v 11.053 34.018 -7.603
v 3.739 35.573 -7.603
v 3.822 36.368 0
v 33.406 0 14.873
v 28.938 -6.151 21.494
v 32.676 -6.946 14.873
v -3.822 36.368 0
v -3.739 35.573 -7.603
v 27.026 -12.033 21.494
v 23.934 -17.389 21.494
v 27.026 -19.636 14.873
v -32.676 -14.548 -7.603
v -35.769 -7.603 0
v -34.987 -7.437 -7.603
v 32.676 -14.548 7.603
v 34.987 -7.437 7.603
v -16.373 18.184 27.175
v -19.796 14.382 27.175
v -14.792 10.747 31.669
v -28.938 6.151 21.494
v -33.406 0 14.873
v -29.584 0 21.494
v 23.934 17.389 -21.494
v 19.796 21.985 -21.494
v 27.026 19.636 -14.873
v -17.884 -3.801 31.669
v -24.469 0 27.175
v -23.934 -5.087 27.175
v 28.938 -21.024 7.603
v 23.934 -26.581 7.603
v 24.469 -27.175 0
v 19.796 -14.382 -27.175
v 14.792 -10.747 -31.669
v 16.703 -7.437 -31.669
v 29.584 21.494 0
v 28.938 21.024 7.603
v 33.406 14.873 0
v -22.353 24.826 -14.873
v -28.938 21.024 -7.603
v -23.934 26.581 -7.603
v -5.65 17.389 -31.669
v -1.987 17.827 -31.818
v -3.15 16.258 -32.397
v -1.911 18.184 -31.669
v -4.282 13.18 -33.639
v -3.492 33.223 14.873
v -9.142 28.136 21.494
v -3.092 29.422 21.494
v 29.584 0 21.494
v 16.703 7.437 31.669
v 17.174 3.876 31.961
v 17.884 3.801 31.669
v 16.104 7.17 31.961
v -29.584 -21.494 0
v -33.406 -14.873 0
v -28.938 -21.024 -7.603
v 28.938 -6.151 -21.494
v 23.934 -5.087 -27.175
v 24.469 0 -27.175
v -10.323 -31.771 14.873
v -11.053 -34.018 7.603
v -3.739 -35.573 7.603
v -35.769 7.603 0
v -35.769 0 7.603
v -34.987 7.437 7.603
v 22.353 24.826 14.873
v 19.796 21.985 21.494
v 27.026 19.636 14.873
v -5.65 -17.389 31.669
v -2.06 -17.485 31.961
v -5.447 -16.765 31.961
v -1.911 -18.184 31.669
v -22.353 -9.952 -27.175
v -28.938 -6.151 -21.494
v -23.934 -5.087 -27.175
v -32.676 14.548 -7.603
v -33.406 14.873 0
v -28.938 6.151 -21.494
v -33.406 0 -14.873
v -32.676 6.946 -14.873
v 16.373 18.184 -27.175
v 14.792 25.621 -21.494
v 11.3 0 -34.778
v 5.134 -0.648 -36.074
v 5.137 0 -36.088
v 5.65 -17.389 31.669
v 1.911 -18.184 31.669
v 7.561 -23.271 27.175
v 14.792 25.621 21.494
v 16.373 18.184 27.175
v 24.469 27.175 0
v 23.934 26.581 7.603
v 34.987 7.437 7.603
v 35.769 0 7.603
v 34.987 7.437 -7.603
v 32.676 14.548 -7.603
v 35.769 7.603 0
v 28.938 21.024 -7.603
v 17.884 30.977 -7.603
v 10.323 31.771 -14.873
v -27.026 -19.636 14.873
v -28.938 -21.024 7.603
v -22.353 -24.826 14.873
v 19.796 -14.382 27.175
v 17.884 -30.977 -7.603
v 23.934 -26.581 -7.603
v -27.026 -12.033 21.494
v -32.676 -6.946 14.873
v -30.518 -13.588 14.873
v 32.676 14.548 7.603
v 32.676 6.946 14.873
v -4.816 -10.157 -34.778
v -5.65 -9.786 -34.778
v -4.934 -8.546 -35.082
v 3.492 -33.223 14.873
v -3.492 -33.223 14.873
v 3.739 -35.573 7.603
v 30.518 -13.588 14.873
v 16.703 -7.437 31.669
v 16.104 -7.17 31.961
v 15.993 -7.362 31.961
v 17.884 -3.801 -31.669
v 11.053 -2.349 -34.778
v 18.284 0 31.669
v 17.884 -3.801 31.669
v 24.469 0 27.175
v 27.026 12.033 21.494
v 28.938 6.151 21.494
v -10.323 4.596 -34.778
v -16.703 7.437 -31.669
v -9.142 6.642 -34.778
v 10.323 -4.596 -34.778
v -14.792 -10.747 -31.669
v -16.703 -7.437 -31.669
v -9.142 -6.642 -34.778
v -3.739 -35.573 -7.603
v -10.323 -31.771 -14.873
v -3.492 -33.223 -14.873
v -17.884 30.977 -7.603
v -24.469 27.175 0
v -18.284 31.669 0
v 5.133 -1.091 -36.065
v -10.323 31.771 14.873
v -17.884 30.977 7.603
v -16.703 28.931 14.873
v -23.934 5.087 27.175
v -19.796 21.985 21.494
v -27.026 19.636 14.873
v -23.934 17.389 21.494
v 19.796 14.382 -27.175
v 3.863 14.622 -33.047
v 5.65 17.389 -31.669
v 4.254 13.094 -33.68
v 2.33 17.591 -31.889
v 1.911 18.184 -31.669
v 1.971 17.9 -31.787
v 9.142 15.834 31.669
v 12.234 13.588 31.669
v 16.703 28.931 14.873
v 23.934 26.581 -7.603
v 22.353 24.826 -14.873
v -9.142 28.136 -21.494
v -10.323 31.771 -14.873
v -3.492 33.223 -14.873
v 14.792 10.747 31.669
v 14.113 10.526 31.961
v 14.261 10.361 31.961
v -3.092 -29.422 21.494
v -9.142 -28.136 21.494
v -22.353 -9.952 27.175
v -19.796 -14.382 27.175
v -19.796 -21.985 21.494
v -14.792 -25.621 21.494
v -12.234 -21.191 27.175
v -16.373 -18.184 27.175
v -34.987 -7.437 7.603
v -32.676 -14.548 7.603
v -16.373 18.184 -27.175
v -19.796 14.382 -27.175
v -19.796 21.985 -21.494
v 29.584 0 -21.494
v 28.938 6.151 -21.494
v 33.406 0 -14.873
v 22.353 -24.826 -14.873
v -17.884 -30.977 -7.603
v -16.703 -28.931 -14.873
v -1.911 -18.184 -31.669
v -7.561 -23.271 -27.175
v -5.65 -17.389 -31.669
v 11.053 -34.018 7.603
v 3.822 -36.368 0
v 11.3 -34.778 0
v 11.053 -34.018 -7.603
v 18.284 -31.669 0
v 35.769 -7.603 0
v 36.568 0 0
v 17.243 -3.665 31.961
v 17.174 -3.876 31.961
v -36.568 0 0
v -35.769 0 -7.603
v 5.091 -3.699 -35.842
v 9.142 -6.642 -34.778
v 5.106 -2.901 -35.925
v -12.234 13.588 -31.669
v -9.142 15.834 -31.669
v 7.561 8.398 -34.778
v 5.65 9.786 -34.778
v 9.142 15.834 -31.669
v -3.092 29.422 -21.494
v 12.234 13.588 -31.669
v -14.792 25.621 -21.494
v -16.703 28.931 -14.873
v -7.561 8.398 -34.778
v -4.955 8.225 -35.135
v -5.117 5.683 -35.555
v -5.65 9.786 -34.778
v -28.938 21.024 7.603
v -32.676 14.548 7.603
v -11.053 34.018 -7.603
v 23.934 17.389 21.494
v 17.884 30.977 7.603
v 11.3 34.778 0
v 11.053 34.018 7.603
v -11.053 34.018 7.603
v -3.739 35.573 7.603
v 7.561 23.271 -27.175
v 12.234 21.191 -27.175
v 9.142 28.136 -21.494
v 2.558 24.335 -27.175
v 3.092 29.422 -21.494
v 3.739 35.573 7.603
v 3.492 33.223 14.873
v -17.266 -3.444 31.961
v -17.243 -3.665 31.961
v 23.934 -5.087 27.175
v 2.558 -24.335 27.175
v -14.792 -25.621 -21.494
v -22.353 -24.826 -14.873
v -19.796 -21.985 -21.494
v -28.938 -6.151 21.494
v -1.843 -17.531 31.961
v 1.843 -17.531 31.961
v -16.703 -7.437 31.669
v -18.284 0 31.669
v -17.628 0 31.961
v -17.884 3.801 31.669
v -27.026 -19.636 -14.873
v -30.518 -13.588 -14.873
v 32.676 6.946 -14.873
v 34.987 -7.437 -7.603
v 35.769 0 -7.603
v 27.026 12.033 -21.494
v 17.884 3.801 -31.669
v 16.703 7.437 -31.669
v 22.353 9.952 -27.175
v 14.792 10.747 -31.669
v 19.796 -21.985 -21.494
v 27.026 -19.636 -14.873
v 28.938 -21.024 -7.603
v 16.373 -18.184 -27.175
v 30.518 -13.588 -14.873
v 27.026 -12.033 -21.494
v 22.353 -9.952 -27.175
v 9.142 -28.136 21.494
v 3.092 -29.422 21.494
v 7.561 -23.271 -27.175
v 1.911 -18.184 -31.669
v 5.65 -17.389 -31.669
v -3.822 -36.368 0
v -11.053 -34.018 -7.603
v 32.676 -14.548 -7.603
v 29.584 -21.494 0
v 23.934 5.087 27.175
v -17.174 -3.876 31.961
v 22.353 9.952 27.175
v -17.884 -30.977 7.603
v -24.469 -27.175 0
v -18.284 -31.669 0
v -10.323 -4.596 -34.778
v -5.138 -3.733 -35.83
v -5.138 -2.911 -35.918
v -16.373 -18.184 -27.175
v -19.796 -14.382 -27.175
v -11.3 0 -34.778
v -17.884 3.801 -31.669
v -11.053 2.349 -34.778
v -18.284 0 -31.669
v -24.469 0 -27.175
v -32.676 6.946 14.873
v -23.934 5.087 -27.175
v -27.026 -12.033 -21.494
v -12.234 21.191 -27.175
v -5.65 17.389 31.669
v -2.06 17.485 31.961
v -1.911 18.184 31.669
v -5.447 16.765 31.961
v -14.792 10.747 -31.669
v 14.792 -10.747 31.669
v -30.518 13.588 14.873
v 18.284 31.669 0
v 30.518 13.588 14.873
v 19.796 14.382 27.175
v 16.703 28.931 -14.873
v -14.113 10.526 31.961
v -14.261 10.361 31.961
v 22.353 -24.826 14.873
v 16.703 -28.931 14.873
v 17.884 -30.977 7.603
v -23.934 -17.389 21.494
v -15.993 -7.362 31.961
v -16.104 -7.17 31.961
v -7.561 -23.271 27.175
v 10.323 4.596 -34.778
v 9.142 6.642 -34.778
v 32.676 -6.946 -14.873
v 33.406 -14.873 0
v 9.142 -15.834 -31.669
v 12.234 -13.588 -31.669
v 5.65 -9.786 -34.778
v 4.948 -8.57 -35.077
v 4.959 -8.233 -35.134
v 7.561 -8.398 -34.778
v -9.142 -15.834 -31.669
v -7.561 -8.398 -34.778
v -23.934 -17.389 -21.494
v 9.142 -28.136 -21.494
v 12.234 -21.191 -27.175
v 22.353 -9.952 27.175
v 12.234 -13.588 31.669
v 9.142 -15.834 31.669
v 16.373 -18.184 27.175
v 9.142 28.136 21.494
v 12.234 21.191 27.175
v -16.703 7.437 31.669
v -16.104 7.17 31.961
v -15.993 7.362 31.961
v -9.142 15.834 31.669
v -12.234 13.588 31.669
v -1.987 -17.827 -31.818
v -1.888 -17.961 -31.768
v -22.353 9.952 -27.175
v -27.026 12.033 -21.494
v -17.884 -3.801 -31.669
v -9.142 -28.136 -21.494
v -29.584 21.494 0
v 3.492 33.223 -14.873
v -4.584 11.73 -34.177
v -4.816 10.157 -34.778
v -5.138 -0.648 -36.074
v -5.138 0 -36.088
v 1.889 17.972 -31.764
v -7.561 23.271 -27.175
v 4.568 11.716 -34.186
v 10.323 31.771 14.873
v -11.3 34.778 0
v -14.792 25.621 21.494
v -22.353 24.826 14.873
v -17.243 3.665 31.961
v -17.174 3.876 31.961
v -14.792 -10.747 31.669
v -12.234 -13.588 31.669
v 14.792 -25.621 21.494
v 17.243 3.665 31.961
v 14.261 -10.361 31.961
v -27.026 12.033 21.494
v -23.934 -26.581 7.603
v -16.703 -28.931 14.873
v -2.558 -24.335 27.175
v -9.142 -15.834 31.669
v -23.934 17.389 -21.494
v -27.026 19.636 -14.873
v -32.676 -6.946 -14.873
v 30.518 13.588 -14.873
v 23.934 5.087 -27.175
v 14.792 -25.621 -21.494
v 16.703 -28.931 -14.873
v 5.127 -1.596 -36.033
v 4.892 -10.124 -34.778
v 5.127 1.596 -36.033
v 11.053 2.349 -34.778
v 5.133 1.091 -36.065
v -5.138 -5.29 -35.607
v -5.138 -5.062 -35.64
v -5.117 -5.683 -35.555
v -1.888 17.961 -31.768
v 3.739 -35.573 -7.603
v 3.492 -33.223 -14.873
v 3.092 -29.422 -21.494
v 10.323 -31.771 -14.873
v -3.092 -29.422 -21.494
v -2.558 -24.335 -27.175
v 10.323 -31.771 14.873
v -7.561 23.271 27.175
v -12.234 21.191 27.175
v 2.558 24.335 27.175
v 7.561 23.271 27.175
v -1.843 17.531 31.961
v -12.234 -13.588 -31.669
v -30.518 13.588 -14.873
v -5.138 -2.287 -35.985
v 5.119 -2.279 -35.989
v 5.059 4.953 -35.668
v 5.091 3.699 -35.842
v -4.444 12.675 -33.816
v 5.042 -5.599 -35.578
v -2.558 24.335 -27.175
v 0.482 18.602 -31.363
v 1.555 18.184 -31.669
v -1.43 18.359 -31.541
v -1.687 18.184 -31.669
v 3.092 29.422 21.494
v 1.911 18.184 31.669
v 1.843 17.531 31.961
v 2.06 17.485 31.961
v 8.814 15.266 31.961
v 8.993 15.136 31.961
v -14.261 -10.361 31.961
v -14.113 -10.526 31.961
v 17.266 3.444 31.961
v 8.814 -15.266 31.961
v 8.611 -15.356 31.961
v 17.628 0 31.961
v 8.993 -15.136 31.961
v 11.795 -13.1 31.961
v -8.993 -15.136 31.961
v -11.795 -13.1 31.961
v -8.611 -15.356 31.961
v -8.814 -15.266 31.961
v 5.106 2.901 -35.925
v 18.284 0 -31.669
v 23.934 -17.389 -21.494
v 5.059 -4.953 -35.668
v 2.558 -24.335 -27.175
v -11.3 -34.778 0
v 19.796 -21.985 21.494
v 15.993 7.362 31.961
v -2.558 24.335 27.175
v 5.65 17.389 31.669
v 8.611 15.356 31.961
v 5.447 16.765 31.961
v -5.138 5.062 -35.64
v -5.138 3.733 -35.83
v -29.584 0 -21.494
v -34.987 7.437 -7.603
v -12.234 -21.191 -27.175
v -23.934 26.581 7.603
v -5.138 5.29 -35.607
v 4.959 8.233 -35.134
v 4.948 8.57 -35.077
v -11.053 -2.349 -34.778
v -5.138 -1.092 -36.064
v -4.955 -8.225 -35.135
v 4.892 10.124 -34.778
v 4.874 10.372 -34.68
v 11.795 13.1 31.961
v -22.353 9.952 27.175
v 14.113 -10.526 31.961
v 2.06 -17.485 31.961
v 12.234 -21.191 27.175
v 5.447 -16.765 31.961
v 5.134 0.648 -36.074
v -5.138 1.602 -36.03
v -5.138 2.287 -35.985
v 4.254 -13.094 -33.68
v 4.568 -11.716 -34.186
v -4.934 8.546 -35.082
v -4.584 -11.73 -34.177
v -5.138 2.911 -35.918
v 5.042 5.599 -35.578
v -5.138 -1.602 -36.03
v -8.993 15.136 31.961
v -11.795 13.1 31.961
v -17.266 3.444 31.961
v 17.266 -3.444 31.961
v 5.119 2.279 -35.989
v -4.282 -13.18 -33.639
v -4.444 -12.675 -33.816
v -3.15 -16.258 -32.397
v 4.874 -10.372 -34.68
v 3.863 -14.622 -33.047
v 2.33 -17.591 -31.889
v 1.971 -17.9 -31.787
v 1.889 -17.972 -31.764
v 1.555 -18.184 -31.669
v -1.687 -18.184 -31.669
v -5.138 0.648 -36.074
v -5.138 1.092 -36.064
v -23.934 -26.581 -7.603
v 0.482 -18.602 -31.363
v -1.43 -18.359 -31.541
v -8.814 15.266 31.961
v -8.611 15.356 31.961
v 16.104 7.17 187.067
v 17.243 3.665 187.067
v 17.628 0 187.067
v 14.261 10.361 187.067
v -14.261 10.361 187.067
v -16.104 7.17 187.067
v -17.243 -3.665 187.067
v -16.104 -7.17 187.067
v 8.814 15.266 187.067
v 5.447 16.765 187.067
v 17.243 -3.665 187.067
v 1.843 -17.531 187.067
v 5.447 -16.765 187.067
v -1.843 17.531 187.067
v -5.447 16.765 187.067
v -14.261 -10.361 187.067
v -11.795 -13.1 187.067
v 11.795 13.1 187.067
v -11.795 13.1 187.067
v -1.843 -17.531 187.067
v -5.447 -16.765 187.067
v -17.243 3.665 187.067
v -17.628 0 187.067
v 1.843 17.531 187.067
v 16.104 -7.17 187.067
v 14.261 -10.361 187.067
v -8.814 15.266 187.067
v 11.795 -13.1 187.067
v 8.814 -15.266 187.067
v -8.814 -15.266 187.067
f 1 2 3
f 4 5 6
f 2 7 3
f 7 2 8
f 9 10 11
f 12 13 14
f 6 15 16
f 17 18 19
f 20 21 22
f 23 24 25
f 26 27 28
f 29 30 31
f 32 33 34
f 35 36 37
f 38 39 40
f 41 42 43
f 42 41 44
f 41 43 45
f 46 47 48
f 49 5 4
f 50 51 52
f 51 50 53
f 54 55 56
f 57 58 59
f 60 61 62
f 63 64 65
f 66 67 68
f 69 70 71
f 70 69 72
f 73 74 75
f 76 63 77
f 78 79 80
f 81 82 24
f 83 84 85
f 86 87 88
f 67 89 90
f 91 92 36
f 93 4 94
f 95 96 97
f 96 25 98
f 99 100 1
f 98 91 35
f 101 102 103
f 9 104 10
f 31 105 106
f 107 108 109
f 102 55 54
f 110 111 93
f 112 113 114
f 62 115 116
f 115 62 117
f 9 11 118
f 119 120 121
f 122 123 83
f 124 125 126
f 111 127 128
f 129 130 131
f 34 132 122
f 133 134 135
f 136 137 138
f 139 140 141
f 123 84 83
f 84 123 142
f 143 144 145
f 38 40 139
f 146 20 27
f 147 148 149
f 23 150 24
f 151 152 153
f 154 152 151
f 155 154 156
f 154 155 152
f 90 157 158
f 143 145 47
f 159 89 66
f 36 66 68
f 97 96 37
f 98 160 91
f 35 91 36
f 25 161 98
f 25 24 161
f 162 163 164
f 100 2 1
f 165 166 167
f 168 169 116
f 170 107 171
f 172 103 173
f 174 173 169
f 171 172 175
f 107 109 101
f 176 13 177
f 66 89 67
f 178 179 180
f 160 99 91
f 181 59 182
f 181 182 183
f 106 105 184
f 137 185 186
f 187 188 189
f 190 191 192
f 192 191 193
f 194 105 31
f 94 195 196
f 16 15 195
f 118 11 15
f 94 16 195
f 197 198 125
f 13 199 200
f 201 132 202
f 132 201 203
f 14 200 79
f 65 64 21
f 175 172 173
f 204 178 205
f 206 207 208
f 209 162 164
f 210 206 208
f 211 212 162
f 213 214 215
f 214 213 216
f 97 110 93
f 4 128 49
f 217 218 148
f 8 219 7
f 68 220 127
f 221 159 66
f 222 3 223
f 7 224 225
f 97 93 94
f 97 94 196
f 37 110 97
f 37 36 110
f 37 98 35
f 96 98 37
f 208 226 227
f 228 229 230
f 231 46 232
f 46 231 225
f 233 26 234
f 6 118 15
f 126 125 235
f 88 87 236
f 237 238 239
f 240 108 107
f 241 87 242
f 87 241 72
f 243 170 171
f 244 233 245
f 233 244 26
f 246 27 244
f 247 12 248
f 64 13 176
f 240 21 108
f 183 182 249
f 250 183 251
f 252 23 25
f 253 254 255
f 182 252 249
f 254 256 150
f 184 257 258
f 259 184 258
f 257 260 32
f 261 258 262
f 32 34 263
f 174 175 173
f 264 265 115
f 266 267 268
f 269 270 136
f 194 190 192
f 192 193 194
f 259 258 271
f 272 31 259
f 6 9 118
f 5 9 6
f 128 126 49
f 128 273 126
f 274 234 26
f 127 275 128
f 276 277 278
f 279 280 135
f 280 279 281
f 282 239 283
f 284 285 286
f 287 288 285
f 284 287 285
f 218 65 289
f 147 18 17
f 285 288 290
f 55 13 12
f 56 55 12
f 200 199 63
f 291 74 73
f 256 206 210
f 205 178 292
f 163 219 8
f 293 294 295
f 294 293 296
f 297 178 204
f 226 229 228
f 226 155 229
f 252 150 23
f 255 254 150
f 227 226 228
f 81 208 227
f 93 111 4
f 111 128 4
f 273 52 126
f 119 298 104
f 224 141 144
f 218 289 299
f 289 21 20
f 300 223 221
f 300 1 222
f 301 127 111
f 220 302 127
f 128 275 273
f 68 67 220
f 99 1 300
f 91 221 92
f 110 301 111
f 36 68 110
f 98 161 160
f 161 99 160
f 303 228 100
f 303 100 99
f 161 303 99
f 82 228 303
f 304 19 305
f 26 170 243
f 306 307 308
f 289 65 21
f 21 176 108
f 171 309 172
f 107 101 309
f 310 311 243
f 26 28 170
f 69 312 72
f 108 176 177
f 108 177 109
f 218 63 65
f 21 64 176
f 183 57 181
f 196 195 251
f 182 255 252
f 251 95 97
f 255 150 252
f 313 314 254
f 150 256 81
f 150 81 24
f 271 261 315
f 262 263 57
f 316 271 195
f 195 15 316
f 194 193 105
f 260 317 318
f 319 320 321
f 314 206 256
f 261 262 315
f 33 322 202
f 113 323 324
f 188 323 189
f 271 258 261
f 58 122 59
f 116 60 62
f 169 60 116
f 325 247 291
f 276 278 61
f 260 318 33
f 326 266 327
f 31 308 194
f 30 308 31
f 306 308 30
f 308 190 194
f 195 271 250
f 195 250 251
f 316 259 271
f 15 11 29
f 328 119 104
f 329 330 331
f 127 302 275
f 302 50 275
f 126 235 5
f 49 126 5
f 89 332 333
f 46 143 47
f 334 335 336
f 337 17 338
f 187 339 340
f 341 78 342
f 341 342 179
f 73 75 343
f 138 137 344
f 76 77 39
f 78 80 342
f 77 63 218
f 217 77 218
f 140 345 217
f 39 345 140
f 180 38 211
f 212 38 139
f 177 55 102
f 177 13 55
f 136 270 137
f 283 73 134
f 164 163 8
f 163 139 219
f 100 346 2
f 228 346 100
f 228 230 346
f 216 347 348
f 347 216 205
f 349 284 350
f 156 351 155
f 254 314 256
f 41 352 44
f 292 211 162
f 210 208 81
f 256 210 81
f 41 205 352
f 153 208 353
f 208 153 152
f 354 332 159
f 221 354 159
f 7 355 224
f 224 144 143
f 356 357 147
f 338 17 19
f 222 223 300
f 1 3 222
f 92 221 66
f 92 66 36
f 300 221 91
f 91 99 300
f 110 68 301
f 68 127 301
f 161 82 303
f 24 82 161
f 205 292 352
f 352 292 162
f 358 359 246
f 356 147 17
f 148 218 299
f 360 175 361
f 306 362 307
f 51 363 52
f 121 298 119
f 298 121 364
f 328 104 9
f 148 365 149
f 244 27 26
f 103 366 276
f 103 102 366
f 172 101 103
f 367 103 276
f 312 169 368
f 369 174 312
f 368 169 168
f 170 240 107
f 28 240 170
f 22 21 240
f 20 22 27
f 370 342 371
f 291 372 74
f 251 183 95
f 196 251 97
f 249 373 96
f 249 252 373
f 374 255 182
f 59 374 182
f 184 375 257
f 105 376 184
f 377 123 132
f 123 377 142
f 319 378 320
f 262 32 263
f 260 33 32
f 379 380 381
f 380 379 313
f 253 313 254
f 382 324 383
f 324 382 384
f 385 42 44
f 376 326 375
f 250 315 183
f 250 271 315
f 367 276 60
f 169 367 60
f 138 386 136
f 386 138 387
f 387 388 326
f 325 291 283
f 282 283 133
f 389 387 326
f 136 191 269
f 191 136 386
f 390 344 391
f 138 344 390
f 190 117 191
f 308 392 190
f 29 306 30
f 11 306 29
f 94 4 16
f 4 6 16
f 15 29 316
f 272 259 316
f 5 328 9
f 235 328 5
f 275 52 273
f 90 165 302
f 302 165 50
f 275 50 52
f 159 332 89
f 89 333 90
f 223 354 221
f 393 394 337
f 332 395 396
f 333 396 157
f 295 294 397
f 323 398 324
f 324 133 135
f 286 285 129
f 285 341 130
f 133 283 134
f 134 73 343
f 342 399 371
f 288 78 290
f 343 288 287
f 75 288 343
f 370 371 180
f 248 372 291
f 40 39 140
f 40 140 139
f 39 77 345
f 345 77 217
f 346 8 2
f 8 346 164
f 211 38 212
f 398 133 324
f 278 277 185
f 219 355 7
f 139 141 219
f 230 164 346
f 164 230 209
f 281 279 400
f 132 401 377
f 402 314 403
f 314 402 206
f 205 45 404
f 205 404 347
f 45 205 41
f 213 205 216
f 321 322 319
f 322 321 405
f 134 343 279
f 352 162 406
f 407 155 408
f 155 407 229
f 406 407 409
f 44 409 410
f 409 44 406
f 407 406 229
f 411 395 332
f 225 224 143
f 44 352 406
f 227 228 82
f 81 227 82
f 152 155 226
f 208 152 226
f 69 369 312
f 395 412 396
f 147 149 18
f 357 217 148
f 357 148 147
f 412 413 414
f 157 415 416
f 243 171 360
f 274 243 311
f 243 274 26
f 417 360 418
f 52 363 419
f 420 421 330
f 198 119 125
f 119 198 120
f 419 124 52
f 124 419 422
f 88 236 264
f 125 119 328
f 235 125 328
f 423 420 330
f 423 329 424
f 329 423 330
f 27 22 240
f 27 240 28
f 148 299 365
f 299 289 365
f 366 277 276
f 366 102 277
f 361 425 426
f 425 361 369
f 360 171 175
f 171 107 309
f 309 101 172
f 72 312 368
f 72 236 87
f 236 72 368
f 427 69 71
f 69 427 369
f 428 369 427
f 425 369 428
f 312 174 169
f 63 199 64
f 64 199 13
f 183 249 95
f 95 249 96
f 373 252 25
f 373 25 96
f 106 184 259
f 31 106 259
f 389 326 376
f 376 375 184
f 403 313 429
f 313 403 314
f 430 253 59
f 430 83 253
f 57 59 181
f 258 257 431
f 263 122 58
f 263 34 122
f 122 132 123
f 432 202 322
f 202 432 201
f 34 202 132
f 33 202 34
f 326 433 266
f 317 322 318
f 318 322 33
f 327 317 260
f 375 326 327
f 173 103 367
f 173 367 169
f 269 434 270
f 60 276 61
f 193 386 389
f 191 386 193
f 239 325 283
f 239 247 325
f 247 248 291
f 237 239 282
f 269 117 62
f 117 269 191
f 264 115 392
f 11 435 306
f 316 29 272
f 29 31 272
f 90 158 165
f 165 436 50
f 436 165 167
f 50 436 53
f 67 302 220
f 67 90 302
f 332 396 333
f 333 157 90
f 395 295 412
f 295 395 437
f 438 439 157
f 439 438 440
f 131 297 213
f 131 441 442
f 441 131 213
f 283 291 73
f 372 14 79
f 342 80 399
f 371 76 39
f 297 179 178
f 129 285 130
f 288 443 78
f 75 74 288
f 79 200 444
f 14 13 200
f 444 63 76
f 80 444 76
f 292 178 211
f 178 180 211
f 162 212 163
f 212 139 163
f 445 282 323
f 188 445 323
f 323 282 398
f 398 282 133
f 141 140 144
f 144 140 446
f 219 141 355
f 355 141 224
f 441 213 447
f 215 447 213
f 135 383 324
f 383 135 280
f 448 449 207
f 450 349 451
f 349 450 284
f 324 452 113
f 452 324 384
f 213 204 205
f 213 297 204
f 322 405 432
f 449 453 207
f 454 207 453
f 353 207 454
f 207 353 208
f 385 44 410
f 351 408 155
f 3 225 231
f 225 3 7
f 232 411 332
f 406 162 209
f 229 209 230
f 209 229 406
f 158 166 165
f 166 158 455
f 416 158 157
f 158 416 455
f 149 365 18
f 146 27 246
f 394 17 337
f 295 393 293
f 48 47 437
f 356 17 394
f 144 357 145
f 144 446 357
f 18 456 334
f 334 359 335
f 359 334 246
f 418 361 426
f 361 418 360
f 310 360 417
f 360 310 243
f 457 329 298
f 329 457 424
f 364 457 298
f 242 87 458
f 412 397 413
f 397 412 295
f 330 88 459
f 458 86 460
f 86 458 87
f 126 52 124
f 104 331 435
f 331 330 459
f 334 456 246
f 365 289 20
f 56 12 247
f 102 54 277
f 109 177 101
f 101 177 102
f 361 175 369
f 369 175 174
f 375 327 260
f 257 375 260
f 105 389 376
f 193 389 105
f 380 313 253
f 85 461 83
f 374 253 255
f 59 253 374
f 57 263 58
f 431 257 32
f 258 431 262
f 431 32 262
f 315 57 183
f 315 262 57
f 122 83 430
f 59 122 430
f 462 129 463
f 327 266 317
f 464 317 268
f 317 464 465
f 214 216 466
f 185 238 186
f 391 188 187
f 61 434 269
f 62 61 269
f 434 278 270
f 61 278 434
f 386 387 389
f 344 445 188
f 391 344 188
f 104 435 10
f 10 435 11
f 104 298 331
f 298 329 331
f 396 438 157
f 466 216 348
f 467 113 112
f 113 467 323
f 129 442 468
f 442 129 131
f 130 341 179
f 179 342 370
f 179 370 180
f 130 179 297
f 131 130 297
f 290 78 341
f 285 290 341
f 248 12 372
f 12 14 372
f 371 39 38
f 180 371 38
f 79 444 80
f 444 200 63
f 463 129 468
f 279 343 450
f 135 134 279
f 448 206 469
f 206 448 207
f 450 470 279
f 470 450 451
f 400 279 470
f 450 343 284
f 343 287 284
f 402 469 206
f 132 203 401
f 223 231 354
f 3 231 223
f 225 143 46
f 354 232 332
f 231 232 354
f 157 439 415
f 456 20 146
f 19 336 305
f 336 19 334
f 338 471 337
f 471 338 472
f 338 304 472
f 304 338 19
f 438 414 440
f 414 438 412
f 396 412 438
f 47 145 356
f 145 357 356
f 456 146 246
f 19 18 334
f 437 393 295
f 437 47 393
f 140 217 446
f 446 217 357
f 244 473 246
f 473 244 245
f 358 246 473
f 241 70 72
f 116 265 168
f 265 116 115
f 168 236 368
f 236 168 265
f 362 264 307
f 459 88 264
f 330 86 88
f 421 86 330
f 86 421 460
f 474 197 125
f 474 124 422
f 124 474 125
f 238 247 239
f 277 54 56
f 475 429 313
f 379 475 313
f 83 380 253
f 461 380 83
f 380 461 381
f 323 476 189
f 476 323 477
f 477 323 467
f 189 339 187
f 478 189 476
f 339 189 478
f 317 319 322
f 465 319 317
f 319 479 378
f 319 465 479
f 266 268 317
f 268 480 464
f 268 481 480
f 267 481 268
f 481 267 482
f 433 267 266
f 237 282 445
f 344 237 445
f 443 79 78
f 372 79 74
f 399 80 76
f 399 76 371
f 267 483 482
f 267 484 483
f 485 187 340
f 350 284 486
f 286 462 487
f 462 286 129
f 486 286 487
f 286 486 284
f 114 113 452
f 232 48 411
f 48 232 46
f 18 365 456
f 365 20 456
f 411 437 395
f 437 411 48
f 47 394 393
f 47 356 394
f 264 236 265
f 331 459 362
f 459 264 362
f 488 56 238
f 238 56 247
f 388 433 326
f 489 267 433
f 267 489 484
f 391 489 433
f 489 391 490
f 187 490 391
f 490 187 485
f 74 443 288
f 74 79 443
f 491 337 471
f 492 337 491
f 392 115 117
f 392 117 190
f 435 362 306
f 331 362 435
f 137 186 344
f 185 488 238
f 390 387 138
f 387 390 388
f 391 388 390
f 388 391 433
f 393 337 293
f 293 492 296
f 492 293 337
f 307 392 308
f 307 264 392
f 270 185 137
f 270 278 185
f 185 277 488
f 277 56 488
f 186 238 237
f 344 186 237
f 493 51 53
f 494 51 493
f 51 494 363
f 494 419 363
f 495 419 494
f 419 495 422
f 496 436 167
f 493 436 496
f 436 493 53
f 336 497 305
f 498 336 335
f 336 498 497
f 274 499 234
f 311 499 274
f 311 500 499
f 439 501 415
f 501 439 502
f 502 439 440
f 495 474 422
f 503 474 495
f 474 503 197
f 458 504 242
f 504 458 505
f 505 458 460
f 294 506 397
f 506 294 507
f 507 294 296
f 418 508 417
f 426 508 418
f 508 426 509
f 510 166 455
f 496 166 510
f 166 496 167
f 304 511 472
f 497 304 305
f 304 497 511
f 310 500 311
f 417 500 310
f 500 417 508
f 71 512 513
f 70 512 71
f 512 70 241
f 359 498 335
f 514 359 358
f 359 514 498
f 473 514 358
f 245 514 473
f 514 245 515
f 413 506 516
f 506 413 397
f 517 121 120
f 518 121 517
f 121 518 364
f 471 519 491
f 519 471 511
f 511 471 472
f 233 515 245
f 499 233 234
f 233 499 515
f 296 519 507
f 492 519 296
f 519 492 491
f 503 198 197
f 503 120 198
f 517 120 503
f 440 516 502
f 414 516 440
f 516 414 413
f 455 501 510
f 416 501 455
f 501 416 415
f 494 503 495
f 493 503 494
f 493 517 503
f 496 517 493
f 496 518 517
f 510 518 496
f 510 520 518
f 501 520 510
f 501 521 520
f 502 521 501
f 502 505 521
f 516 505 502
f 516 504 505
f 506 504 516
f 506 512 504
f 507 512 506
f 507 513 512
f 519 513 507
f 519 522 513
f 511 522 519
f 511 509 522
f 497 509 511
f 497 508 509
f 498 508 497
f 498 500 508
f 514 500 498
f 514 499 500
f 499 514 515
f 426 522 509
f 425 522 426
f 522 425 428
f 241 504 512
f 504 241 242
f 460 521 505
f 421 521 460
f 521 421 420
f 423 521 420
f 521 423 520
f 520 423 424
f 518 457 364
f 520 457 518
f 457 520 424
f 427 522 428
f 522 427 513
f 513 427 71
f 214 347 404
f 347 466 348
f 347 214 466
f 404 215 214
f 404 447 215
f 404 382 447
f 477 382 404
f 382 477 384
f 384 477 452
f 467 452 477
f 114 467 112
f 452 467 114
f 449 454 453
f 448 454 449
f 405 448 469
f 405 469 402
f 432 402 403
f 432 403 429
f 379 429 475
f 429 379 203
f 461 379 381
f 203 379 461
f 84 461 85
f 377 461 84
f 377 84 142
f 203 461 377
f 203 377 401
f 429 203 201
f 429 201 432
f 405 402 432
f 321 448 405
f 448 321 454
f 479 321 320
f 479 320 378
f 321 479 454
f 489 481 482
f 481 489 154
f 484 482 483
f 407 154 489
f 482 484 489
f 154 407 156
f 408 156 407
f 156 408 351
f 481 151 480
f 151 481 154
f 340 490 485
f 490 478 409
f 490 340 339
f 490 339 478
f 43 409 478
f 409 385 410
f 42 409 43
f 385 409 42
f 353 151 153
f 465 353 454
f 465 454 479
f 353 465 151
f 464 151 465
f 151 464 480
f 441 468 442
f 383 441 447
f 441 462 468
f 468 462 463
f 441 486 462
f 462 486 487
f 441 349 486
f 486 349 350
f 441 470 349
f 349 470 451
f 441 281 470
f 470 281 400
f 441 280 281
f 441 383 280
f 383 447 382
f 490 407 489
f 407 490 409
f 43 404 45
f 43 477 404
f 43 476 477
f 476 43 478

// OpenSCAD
seed = 13;
seeds = rands(0,1000000,10,seed);
head_size = rands(25,50,1,seeds[1])[0];
bolt_length = rands(head_size*2,200,1,seeds[3])[0];
bolt_radius = rands(head_size/3, head_size/2,1,seeds[0])[0];
cylinder_size = rands(head_size/7, head_size/4,1, seeds[4])[0];


difference(){
    union(){
        sphere(head_size);
        cylinder(bolt_length,bolt_radius,bolt_radius);
    }
    translate([0,0,-head_size]){
        rotate([90, 0, 0]){
            cylinder(head_size*2, cylinder_size, cylinder_size, center=true);
        }
    }
}
